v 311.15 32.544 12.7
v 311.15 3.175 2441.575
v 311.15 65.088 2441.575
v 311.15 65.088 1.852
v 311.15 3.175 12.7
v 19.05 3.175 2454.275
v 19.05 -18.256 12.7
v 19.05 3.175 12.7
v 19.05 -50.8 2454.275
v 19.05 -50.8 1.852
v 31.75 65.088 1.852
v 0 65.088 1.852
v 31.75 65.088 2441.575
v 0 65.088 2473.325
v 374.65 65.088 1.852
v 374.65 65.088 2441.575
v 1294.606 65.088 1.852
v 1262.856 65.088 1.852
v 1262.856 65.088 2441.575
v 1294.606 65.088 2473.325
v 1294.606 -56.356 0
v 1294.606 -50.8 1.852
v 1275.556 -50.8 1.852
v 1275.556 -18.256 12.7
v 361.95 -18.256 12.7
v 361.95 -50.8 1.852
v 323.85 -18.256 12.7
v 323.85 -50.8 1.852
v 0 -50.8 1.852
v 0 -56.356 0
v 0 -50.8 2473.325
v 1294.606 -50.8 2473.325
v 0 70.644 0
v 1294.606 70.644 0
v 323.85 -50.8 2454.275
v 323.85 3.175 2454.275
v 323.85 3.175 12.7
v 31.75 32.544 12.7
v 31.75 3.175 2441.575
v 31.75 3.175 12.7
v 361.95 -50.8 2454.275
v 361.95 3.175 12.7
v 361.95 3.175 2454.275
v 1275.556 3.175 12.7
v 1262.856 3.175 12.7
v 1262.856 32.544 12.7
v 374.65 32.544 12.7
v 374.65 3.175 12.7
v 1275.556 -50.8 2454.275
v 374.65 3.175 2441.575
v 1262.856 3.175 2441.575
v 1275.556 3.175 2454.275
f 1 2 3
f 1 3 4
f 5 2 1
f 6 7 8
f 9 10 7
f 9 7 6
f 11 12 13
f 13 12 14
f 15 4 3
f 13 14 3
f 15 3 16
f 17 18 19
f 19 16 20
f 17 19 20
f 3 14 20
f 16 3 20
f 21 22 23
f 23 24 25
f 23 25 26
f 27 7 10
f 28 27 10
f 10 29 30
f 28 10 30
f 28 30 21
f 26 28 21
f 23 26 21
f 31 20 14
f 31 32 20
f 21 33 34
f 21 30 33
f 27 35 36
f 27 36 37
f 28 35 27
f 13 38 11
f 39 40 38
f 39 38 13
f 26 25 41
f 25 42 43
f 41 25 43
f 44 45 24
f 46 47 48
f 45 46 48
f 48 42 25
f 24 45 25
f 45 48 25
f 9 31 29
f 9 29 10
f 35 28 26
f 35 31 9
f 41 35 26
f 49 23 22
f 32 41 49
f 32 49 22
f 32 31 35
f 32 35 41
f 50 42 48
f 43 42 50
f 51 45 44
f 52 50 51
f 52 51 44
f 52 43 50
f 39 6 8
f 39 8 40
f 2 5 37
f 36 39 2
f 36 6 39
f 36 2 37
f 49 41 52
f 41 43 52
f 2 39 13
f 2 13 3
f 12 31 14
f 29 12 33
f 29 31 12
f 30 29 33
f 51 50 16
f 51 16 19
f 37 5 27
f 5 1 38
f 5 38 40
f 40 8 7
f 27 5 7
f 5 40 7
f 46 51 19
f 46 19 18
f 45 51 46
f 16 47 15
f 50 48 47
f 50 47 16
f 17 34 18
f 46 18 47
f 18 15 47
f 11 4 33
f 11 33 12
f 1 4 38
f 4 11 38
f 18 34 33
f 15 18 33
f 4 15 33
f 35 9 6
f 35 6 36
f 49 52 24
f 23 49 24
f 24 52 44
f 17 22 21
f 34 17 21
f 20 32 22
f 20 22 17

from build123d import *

# Parameters (mm, degrees)
F3_DEPTH      = 61.9125
F5_DEPTH      = 50.8
F5_DEPTH_BACK = 3.175
F7_DEPTH      = 1294.60625


with BuildPart() as f3:
    # F2 (on offset) → F3 (new body)
    with BuildSketch(Plane.XZ.offset(-3.175)):
        Polygon((0, 2454.275), (0, 0), (19.05, 0), (31.75, 0), (31.75, 2441.575), (311.15, 2441.575), (311.15, 0), (323.85, 0), (342.9, 0), (361.95, 0), (374.65, 0), (374.65, 2441.575), (1262.85625, 2441.575), (1262.85625, 0), (1275.55625, 0), (1294.60625, 0), (1294.60625, 2454.275), (1294.60625, 2473.325), (0, 2473.325), align=None)
    extrude(amount=-F3_DEPTH)

    # F4 (on Front) → F5 (join, two sides)
    with BuildSketch(Plane.XZ) as f5_sk:
        Polygon((0, 2454.275), (0, 0), (19.05, 0), (19.05, 2441.575), (19.05, 2454.275), (323.85, 2454.275), (323.85, 0), (342.9, 0), (361.95, 0), (361.95, 2454.275), (1275.55625, 2454.275), (1275.55625, 2441.575), (1275.55625, 0), (1294.60625, 0), (1294.60625, 2454.275), (1294.60625, 2473.325), (0, 2473.325), align=None)
    extrude(amount=F5_DEPTH)
    extrude(f5_sk.sketch, amount=-F5_DEPTH_BACK)

    # F6 (on Right) → F7 (join, through all)
    with BuildSketch(Plane.YZ):
        Polygon((32.54375, 12.7), (-18.25625, 12.7), (-56.35625, 0), (-50.8, 0), (7.14375, 0), (65.0875, 0), (70.64375, 0), align=None)
    extrude(amount=F7_DEPTH)


solid = f3.part
